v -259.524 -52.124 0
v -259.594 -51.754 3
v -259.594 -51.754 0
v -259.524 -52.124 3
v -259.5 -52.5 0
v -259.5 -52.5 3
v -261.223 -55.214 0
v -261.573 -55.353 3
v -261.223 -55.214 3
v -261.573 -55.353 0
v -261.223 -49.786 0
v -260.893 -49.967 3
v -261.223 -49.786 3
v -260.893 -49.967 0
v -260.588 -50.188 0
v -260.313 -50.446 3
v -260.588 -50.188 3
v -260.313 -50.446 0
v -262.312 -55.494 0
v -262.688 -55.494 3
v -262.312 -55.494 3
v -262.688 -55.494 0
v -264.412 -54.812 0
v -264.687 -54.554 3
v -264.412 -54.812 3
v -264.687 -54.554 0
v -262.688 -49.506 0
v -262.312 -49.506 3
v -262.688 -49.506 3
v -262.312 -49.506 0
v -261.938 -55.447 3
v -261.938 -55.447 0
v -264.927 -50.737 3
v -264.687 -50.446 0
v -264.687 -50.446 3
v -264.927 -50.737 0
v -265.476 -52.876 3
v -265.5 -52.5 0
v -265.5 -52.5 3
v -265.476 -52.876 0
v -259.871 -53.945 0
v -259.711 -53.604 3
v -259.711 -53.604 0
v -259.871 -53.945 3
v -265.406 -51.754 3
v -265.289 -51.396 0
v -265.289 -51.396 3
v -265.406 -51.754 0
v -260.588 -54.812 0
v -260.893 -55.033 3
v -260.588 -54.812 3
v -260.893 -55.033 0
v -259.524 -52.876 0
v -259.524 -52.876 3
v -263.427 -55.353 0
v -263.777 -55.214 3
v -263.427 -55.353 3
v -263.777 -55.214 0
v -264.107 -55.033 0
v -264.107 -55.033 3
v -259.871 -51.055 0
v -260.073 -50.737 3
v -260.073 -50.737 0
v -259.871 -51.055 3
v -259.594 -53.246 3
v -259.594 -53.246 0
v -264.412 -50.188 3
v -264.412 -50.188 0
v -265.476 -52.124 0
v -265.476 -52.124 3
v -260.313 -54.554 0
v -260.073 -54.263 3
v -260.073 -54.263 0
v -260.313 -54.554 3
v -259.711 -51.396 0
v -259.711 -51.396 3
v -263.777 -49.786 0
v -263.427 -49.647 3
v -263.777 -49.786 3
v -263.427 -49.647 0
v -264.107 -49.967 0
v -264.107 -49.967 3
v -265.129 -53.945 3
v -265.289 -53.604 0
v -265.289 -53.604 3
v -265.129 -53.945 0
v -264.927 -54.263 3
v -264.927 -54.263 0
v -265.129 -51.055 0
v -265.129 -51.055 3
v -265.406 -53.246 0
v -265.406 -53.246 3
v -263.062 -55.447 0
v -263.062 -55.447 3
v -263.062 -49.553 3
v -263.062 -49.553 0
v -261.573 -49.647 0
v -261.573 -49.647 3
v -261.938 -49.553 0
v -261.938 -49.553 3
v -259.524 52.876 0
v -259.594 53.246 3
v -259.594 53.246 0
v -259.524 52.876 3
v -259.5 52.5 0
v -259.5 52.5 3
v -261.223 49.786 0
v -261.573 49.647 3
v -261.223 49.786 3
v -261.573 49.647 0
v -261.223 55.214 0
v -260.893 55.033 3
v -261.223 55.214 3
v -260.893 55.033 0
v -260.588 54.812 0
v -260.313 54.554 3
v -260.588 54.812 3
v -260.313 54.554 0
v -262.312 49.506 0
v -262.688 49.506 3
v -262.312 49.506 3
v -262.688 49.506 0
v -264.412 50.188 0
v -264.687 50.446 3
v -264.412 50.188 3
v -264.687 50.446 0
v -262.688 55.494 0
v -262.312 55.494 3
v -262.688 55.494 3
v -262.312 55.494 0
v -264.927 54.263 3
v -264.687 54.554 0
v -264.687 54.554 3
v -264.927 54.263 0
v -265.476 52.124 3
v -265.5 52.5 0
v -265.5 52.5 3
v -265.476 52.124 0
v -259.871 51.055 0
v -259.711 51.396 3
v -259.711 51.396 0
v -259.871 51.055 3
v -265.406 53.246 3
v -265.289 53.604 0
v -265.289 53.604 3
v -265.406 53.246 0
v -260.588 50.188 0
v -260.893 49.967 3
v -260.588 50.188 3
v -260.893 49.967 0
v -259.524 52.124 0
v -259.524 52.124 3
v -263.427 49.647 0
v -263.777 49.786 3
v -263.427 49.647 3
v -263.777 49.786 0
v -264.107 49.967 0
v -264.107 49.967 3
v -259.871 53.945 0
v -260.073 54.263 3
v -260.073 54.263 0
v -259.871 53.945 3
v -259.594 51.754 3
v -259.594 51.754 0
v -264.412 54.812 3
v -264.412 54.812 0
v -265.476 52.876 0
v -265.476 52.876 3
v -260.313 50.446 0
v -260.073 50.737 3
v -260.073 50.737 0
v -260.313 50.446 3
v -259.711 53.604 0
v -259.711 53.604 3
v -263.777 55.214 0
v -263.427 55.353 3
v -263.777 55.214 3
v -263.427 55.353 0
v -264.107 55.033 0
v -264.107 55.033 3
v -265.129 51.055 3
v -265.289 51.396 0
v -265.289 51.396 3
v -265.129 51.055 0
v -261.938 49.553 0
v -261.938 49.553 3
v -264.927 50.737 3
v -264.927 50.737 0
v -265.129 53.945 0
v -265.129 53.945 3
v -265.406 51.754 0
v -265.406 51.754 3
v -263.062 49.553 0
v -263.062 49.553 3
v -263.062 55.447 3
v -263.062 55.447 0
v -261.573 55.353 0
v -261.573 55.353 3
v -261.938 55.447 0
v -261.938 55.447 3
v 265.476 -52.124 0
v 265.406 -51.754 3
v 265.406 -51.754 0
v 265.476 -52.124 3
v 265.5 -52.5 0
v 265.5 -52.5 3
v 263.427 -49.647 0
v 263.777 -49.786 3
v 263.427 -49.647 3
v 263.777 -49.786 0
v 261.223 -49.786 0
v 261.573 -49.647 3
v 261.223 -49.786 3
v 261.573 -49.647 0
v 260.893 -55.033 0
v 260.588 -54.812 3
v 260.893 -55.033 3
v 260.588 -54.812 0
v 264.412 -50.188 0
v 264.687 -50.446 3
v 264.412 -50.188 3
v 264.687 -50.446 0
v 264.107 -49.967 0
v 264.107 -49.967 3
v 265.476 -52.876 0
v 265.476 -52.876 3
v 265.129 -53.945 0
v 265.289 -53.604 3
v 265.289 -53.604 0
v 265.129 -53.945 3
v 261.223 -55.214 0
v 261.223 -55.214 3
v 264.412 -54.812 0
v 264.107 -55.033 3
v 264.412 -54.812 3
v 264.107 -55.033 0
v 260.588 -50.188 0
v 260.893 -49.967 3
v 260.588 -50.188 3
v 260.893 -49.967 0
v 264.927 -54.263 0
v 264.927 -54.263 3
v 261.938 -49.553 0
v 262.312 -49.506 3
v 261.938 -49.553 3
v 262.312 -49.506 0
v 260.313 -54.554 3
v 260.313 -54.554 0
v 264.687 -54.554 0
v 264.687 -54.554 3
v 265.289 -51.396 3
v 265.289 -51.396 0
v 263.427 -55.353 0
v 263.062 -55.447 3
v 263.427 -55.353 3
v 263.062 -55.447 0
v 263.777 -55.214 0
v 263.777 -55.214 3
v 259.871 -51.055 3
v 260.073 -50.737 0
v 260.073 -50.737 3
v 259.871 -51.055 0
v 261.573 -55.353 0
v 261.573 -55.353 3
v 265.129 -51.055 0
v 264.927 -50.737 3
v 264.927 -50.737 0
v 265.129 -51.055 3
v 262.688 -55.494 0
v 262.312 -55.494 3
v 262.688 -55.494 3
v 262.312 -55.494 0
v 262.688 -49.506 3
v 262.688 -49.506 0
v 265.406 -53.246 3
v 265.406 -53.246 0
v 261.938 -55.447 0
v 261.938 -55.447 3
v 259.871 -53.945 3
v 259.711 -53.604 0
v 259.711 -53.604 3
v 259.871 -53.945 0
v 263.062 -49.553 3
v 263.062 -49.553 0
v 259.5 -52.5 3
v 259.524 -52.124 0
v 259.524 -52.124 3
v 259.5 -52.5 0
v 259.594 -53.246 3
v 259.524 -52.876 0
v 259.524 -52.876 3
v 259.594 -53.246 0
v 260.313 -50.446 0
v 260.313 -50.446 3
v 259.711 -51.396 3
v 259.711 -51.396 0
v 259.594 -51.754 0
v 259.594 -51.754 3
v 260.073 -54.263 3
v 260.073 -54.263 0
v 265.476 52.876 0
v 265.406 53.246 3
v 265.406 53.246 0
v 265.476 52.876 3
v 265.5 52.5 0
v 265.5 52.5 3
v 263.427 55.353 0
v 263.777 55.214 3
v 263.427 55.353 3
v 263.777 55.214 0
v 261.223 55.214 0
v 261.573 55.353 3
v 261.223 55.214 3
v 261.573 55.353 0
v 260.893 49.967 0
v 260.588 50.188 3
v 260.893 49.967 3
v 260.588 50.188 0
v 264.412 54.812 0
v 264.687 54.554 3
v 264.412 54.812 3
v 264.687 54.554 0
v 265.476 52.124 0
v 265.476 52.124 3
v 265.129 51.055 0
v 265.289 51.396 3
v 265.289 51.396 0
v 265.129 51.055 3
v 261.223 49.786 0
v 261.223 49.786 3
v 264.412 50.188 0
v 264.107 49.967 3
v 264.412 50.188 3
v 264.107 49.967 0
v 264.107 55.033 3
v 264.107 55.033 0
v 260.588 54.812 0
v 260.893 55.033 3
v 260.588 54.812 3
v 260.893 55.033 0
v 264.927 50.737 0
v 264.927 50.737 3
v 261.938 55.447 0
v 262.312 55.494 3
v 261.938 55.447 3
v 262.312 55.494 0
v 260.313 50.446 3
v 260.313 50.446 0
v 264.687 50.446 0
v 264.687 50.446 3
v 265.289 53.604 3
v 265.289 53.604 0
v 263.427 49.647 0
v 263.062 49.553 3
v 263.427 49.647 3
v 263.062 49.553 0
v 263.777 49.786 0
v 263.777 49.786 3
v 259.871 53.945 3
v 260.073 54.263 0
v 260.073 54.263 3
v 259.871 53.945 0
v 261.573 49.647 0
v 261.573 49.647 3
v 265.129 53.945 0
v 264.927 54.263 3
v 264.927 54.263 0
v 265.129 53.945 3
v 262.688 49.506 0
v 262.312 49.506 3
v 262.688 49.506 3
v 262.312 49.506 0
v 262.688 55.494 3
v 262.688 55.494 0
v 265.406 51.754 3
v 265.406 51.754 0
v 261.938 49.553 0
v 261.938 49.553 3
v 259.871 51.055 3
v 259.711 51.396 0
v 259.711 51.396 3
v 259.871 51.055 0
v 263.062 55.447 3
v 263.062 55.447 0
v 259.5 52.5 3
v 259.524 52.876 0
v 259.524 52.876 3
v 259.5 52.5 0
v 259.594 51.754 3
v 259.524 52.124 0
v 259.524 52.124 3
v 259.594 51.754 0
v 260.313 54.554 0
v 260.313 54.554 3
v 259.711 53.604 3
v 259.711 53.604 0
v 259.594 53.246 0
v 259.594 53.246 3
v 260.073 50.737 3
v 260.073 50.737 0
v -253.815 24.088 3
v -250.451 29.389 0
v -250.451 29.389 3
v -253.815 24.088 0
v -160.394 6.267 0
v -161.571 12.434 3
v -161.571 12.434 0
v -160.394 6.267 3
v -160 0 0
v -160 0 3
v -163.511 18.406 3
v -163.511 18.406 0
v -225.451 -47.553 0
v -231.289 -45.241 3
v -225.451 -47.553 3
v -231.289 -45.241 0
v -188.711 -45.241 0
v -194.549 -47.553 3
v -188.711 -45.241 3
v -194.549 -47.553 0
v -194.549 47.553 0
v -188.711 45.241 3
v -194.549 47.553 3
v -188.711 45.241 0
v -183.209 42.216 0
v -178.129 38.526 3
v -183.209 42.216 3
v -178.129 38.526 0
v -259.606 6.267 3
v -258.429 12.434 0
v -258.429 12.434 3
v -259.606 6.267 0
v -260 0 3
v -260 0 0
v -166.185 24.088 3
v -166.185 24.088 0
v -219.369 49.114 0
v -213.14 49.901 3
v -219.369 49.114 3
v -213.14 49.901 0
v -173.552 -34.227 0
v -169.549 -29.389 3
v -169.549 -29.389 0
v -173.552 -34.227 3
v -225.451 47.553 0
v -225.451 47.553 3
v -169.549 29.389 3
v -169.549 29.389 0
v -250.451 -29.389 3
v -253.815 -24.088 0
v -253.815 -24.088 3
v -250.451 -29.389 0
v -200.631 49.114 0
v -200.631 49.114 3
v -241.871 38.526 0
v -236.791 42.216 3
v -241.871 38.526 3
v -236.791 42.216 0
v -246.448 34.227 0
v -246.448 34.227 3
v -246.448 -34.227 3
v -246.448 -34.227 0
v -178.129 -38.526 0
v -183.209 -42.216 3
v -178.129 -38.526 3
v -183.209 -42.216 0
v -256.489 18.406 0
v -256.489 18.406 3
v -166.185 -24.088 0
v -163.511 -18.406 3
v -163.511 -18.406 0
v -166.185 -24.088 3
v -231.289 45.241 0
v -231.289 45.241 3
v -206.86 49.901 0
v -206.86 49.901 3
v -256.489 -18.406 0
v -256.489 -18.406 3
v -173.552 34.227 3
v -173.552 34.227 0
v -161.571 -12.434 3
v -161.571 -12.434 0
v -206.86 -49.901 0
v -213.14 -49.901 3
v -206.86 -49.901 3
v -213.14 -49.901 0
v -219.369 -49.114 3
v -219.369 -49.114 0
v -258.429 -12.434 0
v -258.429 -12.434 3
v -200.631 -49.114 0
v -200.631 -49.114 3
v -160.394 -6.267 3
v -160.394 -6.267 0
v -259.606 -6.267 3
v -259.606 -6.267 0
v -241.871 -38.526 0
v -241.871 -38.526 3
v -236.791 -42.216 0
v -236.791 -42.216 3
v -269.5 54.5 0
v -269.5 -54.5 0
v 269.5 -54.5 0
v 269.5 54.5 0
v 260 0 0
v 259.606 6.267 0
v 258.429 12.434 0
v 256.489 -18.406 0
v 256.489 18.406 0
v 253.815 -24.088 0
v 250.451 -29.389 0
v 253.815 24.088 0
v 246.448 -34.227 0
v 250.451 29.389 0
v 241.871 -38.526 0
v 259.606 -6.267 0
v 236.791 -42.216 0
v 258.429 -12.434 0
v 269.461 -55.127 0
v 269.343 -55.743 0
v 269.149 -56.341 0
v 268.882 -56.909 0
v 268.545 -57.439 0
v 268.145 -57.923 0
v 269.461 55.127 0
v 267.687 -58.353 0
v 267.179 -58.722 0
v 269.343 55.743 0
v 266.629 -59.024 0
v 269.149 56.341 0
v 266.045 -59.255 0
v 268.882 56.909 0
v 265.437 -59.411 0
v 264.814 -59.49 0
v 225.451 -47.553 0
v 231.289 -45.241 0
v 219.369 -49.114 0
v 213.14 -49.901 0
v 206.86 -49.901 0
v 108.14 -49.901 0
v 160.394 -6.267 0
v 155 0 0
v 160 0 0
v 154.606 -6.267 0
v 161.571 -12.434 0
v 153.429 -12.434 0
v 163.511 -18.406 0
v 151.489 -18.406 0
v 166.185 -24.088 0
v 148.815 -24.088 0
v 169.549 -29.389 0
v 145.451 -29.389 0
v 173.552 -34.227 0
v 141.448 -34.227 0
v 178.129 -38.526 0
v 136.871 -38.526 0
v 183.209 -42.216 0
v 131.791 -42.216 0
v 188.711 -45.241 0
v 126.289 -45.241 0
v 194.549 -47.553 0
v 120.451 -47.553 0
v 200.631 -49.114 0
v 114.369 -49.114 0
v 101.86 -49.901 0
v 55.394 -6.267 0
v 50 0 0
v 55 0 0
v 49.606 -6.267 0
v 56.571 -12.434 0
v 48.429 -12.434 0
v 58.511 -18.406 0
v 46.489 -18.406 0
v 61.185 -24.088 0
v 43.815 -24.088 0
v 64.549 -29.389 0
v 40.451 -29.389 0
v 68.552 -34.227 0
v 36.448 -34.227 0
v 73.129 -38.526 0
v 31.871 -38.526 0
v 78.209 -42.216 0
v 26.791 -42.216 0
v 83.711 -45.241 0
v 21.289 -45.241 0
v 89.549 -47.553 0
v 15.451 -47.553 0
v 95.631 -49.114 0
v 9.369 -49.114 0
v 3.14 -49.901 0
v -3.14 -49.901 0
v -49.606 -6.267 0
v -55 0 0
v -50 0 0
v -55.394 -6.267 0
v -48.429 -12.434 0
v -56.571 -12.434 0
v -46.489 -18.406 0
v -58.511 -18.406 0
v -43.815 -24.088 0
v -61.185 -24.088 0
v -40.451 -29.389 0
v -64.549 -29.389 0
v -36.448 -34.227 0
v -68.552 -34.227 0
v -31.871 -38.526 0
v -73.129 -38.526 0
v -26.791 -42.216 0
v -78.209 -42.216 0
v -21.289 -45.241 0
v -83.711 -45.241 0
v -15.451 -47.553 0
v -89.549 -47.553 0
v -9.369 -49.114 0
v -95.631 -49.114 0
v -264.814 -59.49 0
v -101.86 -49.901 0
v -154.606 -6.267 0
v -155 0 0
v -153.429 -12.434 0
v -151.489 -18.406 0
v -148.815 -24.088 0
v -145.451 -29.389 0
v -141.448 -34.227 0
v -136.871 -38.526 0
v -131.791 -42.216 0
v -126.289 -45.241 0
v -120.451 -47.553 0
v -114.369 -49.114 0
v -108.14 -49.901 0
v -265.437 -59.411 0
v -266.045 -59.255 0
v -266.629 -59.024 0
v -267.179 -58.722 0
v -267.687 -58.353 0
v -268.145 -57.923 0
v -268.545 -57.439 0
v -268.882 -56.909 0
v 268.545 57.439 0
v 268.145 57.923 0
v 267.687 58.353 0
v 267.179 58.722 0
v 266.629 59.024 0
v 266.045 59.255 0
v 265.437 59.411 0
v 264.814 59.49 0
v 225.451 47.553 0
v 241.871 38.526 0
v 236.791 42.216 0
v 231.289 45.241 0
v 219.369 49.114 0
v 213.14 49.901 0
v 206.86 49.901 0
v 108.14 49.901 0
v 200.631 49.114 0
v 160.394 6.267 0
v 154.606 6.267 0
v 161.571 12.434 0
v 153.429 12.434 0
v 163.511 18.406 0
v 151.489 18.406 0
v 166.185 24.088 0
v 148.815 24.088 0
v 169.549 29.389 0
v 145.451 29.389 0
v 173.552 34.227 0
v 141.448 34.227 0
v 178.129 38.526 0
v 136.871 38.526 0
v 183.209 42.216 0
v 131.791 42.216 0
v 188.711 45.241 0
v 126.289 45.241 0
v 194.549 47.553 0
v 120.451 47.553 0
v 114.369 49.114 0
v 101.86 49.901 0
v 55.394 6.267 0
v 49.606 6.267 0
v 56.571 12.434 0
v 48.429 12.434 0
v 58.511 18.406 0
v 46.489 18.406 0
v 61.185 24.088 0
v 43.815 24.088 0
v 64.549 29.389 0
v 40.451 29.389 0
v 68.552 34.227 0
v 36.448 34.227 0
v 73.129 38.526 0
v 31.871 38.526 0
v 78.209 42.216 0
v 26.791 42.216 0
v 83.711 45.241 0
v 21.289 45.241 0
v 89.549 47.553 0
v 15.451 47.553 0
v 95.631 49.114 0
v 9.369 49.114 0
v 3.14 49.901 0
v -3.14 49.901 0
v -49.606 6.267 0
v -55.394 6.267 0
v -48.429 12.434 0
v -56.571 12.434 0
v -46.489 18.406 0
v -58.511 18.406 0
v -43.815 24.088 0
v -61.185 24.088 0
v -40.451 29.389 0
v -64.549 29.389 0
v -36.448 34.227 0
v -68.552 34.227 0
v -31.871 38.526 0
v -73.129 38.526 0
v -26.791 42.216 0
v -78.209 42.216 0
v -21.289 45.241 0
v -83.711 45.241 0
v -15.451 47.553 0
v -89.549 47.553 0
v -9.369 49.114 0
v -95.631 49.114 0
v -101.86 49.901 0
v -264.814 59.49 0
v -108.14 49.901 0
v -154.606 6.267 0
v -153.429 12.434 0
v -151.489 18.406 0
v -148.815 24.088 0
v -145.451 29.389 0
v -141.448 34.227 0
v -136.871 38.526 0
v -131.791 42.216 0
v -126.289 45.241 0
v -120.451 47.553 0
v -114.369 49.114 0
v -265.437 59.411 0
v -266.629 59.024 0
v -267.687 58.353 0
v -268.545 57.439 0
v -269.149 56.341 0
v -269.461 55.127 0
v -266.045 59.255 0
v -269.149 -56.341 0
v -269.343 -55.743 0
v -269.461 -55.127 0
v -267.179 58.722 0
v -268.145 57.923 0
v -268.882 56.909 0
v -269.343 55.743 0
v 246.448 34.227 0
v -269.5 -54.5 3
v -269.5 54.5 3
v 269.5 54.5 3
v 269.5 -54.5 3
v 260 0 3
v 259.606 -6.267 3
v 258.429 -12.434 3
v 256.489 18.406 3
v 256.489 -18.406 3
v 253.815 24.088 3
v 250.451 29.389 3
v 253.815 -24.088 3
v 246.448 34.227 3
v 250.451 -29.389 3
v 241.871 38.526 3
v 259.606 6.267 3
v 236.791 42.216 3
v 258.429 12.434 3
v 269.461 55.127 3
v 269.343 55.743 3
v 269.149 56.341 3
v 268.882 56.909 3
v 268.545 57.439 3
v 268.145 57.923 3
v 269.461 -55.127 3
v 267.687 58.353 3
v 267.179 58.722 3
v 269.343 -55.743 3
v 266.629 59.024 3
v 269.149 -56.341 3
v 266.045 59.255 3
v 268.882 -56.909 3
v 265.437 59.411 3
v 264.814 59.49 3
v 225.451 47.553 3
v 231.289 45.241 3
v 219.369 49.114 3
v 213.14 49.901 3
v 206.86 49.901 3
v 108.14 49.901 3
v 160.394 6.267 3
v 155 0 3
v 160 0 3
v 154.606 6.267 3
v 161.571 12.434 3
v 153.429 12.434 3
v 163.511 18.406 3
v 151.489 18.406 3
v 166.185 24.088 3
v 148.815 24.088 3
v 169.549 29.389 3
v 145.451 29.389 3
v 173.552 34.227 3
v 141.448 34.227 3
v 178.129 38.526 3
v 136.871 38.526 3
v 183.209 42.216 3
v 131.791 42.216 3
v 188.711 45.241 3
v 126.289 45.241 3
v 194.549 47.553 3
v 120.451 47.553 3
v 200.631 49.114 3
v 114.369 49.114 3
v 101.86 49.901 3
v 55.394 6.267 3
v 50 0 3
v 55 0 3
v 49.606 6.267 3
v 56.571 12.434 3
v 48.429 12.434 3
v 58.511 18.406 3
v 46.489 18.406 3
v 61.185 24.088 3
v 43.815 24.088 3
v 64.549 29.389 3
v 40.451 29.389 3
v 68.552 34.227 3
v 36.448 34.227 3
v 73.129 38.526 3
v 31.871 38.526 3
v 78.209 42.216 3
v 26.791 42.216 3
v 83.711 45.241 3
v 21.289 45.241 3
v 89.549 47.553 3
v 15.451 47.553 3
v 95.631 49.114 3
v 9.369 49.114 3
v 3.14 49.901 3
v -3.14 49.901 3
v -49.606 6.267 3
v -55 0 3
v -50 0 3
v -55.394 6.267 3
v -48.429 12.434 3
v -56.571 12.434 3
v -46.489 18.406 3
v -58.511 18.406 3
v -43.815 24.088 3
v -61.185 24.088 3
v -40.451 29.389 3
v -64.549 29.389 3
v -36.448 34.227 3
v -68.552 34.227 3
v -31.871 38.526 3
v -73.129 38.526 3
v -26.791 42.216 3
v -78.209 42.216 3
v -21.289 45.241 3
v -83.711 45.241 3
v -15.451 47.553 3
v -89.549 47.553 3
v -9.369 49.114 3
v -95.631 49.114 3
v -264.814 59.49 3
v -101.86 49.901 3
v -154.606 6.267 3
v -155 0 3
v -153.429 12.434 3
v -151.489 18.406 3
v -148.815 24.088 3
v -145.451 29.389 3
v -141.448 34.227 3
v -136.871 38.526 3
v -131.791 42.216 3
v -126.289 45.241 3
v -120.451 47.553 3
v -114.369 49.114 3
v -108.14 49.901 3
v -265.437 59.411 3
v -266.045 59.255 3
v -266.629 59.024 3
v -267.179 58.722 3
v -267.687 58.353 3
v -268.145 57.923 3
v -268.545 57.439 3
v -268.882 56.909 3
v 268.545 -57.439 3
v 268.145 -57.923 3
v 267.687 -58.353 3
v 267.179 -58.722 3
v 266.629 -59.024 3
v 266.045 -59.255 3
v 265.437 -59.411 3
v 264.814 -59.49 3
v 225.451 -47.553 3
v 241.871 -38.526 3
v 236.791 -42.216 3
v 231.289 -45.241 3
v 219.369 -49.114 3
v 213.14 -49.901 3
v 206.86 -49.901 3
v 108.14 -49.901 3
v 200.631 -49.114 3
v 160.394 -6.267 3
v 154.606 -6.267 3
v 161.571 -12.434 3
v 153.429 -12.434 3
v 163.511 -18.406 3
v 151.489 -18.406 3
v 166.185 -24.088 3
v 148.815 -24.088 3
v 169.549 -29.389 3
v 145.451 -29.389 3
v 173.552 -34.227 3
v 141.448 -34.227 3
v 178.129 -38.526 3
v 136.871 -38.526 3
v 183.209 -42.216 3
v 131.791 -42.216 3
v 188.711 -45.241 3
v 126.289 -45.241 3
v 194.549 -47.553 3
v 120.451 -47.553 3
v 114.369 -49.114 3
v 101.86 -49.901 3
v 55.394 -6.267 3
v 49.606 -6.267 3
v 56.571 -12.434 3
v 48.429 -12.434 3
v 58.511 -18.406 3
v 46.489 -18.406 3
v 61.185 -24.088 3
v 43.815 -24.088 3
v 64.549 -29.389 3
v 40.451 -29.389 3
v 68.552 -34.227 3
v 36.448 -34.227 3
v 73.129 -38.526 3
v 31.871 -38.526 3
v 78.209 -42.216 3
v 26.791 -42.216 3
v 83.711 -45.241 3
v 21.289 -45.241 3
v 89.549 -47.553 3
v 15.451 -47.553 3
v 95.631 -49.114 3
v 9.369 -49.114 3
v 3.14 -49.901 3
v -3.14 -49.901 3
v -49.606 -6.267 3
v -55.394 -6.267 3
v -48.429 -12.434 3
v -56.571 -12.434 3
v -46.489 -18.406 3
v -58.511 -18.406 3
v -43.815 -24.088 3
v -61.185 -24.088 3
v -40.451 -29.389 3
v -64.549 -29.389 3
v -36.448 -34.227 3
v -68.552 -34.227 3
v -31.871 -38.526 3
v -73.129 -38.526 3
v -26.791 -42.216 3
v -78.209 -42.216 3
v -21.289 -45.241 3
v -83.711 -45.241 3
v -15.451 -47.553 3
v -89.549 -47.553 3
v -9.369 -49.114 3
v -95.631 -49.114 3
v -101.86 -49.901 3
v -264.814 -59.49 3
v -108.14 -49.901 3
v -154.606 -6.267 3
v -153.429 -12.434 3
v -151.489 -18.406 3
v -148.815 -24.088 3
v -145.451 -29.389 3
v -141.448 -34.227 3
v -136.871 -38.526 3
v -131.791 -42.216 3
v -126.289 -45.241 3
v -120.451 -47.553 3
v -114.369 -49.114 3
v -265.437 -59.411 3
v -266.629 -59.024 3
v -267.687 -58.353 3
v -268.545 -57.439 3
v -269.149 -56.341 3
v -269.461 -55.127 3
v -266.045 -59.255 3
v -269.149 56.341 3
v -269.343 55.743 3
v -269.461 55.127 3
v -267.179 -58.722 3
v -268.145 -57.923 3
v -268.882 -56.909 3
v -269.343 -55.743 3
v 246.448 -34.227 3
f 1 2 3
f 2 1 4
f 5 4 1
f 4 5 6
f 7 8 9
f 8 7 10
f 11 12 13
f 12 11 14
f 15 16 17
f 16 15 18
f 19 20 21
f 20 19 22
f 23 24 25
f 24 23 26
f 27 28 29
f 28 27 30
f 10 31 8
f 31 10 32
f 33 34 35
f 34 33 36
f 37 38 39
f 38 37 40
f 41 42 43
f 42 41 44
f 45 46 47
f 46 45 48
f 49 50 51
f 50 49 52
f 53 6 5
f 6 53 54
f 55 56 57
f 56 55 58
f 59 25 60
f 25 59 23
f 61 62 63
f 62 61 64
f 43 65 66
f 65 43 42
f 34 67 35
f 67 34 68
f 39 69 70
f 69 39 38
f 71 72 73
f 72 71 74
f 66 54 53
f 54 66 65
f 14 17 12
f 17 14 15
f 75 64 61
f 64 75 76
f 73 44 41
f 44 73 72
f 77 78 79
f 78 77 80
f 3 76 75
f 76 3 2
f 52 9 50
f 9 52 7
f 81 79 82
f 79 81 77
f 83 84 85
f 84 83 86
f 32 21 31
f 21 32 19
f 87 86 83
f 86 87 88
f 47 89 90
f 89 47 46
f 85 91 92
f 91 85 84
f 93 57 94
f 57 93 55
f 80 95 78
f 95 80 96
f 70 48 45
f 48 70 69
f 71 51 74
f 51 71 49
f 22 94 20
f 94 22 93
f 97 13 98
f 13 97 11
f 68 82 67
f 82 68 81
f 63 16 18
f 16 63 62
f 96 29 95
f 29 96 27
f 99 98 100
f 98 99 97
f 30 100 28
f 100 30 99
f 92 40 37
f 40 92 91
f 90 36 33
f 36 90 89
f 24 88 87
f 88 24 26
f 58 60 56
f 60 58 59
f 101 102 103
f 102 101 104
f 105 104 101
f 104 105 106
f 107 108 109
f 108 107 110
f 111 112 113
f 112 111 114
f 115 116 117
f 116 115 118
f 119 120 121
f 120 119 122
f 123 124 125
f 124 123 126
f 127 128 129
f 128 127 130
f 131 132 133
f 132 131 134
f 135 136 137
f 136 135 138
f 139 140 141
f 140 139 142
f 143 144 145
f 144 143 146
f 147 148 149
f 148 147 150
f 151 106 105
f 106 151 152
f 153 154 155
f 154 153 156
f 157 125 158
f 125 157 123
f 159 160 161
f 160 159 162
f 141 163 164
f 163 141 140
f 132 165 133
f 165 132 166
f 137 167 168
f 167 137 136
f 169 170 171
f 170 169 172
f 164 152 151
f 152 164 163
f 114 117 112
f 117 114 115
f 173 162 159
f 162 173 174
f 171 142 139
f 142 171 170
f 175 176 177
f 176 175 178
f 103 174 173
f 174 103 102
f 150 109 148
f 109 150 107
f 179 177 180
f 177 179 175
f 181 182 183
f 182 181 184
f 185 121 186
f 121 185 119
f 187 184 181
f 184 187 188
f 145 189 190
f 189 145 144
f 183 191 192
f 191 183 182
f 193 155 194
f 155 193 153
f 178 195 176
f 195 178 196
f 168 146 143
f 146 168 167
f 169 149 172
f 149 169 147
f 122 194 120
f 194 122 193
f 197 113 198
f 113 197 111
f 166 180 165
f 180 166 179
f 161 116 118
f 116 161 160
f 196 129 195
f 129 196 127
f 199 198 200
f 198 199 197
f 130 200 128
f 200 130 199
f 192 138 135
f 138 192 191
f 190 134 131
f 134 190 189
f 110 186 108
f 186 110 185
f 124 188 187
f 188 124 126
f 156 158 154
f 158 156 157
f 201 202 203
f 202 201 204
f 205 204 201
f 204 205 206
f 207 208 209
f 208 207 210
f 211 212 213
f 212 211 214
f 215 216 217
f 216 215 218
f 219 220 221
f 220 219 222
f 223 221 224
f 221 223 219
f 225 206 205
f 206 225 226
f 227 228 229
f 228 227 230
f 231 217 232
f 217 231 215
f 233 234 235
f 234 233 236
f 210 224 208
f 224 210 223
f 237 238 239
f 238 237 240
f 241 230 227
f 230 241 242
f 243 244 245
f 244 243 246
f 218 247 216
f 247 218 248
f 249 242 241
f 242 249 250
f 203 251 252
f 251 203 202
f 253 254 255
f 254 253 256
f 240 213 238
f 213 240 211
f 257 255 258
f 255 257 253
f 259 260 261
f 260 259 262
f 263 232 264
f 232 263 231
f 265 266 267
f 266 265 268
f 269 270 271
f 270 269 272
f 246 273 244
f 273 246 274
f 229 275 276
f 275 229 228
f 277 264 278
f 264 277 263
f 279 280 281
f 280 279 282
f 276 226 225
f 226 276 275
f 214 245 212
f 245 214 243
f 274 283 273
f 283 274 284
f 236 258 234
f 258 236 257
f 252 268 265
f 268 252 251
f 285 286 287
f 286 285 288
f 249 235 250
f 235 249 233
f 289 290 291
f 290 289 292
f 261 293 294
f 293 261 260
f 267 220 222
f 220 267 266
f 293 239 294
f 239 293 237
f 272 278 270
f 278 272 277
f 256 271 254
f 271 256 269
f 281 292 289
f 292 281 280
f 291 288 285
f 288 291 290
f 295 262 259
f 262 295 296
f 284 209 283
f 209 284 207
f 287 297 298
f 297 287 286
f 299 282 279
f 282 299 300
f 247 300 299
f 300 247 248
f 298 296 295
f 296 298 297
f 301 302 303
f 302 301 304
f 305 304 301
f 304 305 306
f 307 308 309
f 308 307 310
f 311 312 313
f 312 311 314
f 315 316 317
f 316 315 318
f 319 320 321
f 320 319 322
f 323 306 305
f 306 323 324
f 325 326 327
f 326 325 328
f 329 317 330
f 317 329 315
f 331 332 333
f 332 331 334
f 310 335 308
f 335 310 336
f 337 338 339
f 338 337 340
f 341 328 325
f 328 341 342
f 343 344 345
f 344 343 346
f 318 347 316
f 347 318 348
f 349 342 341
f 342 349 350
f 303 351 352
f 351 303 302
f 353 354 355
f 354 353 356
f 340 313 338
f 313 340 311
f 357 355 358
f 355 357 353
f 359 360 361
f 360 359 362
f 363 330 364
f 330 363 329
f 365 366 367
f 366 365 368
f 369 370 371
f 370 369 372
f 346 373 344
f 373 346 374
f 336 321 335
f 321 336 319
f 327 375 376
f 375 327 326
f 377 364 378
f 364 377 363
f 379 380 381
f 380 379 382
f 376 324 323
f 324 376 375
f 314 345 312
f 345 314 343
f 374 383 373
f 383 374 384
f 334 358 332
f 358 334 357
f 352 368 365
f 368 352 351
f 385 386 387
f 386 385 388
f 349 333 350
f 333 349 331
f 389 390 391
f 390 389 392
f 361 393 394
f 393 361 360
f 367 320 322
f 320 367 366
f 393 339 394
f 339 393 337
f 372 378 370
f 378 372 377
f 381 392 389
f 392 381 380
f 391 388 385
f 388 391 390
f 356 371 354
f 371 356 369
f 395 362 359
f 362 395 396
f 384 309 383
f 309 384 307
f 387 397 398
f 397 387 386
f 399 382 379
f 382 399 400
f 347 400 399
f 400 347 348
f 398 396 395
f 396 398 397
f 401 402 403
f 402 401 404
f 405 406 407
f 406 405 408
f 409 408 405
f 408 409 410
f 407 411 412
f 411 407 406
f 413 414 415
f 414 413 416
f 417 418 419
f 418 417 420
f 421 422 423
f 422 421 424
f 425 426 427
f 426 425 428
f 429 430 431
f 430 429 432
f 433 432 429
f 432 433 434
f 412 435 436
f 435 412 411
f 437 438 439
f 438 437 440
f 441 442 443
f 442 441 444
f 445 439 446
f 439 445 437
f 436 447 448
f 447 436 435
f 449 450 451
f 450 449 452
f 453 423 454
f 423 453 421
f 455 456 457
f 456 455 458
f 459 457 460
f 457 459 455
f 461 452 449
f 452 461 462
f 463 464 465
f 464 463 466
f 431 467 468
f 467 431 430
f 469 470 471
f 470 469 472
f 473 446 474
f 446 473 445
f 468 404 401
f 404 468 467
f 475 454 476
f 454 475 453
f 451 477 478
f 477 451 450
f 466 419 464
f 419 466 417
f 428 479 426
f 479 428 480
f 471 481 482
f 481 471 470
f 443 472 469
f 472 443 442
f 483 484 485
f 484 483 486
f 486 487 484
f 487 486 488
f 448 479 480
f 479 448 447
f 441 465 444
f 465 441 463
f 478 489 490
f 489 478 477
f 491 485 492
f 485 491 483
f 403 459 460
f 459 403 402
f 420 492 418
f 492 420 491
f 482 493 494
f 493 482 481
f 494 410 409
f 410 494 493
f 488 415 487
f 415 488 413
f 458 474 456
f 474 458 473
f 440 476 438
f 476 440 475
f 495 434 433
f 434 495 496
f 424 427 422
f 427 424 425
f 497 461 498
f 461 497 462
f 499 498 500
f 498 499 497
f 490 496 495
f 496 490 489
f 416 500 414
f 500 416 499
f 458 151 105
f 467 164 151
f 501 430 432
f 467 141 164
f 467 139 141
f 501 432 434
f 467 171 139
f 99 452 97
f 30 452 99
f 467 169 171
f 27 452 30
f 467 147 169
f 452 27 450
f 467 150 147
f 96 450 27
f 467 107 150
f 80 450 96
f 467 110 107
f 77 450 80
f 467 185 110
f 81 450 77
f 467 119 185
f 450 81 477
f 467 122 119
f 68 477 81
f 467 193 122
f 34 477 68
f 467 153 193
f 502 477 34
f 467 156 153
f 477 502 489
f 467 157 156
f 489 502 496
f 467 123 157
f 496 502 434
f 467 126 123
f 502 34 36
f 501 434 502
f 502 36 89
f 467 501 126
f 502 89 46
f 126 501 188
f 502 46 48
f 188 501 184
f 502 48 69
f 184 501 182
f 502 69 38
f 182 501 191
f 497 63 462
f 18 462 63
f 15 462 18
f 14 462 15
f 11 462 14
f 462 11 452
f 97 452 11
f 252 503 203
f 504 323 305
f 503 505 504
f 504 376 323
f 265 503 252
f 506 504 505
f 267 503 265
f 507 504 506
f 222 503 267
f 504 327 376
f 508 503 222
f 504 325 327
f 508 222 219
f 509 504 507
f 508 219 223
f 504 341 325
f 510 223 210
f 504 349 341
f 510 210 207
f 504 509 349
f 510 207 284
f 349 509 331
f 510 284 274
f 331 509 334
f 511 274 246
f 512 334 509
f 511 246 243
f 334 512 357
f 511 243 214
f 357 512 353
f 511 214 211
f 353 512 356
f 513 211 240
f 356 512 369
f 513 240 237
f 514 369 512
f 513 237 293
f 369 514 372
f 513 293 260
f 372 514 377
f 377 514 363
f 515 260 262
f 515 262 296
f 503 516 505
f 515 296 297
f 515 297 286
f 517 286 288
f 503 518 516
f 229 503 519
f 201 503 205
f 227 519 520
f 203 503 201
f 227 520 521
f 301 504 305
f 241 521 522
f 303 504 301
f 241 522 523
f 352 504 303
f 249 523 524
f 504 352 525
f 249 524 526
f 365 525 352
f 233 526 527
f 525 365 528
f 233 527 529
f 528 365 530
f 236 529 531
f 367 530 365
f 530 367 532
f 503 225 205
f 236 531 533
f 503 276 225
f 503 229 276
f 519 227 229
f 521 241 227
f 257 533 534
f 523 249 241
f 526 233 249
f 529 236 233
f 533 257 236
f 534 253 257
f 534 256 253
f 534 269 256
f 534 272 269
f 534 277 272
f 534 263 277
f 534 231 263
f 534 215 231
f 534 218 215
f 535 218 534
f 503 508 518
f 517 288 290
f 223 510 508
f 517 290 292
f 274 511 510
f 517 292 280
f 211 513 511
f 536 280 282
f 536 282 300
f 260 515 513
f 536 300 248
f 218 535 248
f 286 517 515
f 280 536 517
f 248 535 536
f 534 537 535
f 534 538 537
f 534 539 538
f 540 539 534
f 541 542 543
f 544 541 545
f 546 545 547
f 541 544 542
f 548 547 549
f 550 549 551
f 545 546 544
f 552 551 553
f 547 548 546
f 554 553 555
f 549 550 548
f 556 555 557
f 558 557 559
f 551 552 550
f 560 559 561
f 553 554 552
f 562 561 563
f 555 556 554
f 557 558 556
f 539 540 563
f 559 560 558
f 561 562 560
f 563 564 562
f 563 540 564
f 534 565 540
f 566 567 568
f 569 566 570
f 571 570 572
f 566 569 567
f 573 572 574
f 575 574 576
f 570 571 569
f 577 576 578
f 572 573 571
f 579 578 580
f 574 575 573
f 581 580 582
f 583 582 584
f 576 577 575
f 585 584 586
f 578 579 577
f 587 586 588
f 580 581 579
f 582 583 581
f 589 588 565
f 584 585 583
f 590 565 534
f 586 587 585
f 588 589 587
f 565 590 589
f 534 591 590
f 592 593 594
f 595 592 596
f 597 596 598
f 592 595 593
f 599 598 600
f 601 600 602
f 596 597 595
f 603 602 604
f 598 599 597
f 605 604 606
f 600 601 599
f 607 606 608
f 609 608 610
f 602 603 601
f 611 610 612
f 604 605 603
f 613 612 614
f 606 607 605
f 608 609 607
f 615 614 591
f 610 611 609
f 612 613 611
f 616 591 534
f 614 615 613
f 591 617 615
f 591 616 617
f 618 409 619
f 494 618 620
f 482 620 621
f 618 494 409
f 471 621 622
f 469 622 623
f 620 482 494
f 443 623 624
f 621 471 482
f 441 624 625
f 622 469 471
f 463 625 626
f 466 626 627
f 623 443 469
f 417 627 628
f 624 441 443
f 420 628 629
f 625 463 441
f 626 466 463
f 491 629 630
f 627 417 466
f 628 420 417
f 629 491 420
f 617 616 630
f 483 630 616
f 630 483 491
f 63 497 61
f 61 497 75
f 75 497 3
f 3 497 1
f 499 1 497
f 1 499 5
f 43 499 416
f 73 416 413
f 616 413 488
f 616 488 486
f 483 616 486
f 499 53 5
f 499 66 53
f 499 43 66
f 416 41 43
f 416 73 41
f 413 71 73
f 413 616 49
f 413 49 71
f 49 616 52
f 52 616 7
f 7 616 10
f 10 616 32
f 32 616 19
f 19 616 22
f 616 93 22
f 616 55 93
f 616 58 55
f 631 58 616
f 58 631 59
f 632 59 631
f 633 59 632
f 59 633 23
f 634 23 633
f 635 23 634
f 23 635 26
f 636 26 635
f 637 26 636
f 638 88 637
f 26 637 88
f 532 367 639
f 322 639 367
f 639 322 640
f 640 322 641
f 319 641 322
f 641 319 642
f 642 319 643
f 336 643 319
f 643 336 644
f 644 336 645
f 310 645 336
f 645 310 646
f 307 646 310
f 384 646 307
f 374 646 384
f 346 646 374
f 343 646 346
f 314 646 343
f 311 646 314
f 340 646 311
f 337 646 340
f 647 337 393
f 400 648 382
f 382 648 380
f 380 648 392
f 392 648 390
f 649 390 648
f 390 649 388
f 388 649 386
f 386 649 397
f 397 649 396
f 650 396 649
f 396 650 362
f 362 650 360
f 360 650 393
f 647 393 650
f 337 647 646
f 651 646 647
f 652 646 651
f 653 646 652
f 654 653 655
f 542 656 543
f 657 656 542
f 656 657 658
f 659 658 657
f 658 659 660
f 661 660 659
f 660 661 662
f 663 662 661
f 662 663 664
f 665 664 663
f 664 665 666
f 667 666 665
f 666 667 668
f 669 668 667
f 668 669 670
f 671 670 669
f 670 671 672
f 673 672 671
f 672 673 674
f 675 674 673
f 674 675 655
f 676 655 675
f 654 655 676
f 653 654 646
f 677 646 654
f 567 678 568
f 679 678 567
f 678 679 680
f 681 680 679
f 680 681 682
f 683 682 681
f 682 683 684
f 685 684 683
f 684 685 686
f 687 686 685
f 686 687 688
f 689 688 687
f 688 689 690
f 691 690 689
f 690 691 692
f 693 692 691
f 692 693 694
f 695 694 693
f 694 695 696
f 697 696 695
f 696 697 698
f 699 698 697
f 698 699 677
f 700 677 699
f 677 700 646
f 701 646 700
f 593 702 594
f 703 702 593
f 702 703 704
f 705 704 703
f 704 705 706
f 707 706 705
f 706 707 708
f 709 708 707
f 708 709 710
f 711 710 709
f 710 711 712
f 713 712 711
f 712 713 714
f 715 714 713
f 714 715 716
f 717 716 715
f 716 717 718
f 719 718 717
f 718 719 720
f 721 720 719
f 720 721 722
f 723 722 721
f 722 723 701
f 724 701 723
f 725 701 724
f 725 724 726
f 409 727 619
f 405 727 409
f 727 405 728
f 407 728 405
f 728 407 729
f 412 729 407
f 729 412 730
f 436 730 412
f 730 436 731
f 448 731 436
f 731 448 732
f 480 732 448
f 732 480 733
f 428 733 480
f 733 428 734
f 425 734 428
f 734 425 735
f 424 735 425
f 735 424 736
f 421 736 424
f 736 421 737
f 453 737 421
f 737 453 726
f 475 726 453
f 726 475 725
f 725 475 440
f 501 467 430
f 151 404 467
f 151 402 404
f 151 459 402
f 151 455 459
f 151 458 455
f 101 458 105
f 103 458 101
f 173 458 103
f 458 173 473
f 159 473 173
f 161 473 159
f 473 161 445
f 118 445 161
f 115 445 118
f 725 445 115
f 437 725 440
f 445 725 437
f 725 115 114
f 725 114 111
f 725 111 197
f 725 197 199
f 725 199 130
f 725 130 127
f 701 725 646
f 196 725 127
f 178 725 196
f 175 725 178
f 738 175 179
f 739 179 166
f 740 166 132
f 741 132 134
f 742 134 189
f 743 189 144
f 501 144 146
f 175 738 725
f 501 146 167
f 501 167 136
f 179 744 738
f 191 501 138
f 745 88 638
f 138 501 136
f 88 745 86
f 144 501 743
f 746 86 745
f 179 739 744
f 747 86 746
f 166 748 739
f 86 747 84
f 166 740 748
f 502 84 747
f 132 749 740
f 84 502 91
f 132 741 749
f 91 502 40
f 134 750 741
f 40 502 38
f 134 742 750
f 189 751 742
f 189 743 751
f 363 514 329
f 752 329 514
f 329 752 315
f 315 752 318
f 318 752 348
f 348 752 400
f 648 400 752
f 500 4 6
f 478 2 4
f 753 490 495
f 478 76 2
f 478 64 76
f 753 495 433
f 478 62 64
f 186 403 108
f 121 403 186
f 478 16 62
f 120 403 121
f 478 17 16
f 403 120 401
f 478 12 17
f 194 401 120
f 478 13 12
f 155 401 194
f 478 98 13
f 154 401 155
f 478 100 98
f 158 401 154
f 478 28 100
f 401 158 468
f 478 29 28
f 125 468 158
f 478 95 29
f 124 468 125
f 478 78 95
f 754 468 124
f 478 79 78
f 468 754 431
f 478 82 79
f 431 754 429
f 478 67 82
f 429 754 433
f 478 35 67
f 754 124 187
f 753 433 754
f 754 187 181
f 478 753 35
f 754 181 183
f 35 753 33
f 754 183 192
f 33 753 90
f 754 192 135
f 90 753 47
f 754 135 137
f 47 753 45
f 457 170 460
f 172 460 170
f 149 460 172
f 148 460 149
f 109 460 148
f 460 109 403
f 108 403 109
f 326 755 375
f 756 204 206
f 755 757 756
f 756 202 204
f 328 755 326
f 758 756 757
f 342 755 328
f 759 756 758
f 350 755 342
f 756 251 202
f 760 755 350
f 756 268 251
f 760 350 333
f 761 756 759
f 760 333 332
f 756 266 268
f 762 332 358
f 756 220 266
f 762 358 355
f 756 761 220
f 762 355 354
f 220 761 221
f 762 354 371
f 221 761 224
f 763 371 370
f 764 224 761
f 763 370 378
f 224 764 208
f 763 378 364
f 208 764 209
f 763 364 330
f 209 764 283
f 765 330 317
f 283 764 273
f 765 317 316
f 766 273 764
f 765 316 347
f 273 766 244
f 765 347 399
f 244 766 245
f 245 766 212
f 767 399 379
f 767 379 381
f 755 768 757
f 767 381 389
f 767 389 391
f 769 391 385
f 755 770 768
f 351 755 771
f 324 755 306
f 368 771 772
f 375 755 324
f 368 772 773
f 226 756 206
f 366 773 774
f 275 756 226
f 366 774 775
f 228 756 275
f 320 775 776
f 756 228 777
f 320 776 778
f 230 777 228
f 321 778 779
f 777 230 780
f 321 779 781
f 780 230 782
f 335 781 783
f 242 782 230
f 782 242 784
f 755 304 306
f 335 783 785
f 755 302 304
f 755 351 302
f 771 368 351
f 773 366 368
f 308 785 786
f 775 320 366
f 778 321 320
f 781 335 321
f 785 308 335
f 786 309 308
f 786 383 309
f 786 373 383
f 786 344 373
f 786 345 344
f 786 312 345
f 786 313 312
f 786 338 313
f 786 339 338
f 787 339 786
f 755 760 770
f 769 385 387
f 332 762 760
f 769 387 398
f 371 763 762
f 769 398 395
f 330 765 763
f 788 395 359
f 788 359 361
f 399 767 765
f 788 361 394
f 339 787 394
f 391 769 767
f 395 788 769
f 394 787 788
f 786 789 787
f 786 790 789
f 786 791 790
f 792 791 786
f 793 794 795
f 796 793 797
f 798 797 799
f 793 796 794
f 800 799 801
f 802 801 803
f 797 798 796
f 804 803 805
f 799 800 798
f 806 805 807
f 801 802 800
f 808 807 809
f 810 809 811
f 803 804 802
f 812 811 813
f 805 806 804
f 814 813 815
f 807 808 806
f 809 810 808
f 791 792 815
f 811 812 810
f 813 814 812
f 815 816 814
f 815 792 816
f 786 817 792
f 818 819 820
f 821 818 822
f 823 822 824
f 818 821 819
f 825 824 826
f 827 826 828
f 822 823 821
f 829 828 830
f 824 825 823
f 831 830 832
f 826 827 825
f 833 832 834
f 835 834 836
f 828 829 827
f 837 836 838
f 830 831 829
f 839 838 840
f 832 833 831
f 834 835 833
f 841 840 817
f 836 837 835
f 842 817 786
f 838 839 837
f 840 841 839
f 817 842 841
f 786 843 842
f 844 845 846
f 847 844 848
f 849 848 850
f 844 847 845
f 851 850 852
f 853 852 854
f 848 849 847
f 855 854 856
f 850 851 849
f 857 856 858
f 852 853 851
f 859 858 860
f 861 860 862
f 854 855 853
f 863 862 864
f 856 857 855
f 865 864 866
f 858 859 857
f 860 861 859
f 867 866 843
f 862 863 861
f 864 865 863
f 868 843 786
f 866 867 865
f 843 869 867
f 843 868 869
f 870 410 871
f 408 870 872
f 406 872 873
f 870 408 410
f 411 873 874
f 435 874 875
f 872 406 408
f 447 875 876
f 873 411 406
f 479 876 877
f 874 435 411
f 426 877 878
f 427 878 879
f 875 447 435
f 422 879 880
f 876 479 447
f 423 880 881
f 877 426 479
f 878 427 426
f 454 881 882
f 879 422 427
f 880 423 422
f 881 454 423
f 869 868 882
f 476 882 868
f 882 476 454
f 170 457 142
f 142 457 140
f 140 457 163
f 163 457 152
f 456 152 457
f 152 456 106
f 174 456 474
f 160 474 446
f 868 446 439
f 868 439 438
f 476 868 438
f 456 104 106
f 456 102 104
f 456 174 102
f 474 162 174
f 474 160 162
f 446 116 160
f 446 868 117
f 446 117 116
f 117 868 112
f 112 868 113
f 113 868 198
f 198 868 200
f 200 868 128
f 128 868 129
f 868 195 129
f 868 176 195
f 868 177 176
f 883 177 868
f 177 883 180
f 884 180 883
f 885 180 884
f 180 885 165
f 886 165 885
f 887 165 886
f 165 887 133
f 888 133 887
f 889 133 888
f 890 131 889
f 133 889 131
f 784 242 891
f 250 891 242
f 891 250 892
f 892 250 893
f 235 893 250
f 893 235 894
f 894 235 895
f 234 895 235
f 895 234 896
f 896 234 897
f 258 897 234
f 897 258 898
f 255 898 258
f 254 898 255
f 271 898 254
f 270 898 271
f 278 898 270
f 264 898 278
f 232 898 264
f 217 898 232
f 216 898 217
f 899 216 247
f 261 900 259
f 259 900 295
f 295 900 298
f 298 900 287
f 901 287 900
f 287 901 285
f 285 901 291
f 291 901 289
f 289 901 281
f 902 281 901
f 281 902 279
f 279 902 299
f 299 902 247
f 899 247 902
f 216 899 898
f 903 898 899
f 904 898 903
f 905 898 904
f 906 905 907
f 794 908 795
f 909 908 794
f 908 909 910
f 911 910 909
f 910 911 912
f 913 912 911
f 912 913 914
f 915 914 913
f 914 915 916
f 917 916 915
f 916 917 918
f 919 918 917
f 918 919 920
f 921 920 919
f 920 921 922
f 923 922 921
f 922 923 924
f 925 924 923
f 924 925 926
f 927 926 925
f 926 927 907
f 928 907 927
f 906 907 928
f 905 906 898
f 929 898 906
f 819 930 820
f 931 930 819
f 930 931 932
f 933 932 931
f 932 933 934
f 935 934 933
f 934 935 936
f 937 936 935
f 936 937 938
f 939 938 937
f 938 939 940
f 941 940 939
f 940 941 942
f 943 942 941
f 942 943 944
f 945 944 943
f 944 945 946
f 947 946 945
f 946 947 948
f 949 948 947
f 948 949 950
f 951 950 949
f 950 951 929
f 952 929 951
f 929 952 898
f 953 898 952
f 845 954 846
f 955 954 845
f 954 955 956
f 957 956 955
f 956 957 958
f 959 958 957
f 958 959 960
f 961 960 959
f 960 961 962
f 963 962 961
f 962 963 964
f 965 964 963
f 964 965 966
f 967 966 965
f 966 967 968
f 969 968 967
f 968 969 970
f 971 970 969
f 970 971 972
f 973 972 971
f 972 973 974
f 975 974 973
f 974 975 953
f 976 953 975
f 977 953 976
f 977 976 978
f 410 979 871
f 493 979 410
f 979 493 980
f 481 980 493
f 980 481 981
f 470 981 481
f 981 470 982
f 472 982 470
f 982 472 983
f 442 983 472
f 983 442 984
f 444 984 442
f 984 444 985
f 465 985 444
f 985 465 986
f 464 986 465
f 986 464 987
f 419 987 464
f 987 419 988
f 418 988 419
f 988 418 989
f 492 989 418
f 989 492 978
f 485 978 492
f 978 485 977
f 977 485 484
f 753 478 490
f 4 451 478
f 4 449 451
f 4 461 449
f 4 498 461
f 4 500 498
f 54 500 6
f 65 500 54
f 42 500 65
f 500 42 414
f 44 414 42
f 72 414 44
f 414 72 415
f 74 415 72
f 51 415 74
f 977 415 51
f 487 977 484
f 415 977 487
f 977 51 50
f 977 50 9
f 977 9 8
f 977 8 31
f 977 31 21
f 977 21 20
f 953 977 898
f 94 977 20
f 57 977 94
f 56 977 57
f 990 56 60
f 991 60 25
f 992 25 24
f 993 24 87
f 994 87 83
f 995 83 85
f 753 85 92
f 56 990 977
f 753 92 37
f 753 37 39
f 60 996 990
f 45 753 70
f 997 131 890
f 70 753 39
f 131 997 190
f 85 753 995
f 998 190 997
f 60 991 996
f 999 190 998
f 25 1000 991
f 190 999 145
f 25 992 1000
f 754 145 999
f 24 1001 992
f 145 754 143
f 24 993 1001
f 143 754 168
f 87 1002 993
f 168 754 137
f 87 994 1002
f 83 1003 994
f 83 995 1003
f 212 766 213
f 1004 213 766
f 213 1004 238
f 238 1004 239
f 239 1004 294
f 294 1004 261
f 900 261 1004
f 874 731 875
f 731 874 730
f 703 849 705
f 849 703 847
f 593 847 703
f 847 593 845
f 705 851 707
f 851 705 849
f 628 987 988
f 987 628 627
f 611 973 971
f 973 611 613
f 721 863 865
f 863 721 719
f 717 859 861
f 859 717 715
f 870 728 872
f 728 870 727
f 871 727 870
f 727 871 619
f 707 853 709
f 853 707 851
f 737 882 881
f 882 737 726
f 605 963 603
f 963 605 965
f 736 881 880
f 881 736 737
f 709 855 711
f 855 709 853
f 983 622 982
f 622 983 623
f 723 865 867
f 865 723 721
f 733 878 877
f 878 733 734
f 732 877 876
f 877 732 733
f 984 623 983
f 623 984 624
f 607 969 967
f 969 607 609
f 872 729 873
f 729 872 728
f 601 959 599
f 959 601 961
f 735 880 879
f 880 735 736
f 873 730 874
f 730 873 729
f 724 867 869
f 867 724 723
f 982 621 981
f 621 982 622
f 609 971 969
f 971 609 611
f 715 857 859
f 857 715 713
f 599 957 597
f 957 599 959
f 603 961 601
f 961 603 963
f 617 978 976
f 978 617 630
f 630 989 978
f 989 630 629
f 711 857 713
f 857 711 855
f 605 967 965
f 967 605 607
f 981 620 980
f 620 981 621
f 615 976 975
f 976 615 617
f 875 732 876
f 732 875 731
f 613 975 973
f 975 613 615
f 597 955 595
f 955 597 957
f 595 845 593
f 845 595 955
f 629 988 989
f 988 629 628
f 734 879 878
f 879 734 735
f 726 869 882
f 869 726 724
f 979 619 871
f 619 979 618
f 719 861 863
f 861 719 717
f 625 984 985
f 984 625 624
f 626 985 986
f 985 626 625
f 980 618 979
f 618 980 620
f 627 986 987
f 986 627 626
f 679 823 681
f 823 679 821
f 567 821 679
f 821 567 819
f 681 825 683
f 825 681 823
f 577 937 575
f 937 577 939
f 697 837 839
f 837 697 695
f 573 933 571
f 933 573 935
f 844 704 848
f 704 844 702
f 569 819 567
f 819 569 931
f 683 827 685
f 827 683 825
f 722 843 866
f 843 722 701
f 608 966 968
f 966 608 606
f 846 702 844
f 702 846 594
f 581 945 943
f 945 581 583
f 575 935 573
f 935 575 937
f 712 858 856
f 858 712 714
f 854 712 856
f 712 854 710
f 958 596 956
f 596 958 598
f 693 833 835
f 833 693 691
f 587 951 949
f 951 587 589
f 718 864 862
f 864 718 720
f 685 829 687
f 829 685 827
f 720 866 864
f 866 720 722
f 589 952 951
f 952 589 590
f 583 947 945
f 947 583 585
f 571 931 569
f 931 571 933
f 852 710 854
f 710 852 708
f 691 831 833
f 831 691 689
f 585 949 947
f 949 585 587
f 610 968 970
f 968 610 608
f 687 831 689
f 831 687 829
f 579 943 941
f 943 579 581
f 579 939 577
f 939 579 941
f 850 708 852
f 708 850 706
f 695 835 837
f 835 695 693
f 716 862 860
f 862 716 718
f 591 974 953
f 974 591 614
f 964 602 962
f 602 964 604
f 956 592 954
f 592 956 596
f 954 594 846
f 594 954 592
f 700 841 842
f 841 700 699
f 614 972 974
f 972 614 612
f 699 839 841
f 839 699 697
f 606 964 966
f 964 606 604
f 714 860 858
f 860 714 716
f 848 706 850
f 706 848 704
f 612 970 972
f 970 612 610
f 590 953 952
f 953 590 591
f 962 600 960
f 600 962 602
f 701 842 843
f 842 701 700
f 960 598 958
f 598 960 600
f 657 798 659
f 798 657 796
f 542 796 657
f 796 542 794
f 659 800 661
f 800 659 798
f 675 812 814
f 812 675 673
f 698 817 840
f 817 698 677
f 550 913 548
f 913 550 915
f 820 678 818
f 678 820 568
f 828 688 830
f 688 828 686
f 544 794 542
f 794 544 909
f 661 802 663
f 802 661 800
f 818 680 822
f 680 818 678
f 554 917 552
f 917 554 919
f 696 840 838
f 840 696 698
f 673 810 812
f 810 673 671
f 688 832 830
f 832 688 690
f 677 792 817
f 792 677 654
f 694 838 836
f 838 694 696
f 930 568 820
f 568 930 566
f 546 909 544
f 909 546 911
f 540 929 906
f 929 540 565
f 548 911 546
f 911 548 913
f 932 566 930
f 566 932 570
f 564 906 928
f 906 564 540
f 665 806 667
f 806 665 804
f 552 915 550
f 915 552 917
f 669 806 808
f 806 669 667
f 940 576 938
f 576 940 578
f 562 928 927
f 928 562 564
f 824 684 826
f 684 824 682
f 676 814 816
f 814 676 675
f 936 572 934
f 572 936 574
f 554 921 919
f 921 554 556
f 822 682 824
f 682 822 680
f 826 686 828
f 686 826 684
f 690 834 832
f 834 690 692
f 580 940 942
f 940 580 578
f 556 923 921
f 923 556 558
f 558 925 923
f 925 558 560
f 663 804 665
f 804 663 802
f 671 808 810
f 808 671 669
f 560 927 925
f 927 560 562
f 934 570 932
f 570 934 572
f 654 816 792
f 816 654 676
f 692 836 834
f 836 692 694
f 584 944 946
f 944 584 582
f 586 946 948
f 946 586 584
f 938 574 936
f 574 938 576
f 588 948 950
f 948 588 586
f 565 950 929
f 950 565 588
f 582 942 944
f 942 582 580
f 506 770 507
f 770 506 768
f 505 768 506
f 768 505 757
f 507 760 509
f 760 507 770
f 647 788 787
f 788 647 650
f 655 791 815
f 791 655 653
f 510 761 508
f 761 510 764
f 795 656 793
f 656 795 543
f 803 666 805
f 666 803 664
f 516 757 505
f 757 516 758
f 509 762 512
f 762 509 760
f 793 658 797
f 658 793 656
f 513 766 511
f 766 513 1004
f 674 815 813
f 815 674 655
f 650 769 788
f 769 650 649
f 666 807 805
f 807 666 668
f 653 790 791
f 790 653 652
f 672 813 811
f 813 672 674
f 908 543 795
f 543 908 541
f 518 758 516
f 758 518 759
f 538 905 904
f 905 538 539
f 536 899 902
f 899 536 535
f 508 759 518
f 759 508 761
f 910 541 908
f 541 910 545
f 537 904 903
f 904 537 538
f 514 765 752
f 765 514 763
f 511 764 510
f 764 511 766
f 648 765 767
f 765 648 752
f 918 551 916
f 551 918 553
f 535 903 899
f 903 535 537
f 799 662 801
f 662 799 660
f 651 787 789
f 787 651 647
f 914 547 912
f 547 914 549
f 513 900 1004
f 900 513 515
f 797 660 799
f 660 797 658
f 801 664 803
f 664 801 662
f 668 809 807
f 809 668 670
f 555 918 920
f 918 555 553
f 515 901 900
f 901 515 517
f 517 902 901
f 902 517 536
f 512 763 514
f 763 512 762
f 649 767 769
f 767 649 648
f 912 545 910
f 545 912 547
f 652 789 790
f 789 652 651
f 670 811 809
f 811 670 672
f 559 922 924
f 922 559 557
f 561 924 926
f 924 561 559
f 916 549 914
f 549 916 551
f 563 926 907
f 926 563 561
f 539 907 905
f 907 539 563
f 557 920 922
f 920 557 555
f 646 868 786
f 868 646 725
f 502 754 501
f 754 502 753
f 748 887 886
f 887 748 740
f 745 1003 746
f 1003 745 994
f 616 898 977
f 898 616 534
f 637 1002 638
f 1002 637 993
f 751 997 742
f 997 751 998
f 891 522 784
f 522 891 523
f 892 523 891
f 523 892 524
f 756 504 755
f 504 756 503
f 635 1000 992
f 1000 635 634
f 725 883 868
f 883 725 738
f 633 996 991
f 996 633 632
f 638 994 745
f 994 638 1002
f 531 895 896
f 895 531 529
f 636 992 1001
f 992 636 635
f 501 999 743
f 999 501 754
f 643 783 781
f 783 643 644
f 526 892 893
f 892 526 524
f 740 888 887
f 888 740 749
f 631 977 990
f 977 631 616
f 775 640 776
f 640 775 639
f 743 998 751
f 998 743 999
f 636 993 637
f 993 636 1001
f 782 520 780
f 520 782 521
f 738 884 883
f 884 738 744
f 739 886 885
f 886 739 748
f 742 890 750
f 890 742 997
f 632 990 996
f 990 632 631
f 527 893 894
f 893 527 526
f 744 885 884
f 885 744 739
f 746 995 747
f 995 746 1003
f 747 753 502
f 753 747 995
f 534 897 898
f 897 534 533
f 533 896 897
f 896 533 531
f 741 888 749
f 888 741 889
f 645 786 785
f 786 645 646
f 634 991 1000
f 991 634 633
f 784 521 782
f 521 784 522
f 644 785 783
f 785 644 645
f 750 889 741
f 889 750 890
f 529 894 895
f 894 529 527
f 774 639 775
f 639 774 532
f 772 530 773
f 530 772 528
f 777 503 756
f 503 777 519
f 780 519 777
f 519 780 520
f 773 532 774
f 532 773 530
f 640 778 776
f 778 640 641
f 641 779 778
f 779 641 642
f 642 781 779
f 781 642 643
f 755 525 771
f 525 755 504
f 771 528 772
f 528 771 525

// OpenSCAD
$fn = 50;


difference() {
	union() {
		hull() {
			translate(v = [-264.5000000000, 54.5000000000, 0]) {
				cylinder(h = 3, r = 5);
			}
			translate(v = [264.5000000000, 54.5000000000, 0]) {
				cylinder(h = 3, r = 5);
			}
			translate(v = [-264.5000000000, -54.5000000000, 0]) {
				cylinder(h = 3, r = 5);
			}
			translate(v = [264.5000000000, -54.5000000000, 0]) {
				cylinder(h = 3, r = 5);
			}
		}
	}
	union() {
		#translate(v = [-262.5000000000, -52.5000000000, -100.0000000000]) {
			cylinder(h = 200, r = 3.0000000000);
		}
		#translate(v = [-262.5000000000, 52.5000000000, -100.0000000000]) {
			cylinder(h = 200, r = 3.0000000000);
		}
		#translate(v = [262.5000000000, -52.5000000000, -100.0000000000]) {
			cylinder(h = 200, r = 3.0000000000);
		}
		#translate(v = [262.5000000000, 52.5000000000, -100.0000000000]) {
			cylinder(h = 200, r = 3.0000000000);
		}
		#translate(v = [-210.0000000000, 0, 0]) {
			cylinder(h = 3, r = 50.0000000000);
		}
		#translate(v = [-105.0000000000, 0, 0]) {
			cylinder(h = 3, r = 50.0000000000);
		}
		#cylinder(h = 3, r = 50.0000000000);
		#translate(v = [105.0000000000, 0, 0]) {
			cylinder(h = 3, r = 50.0000000000);
		}
		#translate(v = [210.0000000000, 0, 0]) {
			cylinder(h = 3, r = 50.0000000000);
		}
	}
}
